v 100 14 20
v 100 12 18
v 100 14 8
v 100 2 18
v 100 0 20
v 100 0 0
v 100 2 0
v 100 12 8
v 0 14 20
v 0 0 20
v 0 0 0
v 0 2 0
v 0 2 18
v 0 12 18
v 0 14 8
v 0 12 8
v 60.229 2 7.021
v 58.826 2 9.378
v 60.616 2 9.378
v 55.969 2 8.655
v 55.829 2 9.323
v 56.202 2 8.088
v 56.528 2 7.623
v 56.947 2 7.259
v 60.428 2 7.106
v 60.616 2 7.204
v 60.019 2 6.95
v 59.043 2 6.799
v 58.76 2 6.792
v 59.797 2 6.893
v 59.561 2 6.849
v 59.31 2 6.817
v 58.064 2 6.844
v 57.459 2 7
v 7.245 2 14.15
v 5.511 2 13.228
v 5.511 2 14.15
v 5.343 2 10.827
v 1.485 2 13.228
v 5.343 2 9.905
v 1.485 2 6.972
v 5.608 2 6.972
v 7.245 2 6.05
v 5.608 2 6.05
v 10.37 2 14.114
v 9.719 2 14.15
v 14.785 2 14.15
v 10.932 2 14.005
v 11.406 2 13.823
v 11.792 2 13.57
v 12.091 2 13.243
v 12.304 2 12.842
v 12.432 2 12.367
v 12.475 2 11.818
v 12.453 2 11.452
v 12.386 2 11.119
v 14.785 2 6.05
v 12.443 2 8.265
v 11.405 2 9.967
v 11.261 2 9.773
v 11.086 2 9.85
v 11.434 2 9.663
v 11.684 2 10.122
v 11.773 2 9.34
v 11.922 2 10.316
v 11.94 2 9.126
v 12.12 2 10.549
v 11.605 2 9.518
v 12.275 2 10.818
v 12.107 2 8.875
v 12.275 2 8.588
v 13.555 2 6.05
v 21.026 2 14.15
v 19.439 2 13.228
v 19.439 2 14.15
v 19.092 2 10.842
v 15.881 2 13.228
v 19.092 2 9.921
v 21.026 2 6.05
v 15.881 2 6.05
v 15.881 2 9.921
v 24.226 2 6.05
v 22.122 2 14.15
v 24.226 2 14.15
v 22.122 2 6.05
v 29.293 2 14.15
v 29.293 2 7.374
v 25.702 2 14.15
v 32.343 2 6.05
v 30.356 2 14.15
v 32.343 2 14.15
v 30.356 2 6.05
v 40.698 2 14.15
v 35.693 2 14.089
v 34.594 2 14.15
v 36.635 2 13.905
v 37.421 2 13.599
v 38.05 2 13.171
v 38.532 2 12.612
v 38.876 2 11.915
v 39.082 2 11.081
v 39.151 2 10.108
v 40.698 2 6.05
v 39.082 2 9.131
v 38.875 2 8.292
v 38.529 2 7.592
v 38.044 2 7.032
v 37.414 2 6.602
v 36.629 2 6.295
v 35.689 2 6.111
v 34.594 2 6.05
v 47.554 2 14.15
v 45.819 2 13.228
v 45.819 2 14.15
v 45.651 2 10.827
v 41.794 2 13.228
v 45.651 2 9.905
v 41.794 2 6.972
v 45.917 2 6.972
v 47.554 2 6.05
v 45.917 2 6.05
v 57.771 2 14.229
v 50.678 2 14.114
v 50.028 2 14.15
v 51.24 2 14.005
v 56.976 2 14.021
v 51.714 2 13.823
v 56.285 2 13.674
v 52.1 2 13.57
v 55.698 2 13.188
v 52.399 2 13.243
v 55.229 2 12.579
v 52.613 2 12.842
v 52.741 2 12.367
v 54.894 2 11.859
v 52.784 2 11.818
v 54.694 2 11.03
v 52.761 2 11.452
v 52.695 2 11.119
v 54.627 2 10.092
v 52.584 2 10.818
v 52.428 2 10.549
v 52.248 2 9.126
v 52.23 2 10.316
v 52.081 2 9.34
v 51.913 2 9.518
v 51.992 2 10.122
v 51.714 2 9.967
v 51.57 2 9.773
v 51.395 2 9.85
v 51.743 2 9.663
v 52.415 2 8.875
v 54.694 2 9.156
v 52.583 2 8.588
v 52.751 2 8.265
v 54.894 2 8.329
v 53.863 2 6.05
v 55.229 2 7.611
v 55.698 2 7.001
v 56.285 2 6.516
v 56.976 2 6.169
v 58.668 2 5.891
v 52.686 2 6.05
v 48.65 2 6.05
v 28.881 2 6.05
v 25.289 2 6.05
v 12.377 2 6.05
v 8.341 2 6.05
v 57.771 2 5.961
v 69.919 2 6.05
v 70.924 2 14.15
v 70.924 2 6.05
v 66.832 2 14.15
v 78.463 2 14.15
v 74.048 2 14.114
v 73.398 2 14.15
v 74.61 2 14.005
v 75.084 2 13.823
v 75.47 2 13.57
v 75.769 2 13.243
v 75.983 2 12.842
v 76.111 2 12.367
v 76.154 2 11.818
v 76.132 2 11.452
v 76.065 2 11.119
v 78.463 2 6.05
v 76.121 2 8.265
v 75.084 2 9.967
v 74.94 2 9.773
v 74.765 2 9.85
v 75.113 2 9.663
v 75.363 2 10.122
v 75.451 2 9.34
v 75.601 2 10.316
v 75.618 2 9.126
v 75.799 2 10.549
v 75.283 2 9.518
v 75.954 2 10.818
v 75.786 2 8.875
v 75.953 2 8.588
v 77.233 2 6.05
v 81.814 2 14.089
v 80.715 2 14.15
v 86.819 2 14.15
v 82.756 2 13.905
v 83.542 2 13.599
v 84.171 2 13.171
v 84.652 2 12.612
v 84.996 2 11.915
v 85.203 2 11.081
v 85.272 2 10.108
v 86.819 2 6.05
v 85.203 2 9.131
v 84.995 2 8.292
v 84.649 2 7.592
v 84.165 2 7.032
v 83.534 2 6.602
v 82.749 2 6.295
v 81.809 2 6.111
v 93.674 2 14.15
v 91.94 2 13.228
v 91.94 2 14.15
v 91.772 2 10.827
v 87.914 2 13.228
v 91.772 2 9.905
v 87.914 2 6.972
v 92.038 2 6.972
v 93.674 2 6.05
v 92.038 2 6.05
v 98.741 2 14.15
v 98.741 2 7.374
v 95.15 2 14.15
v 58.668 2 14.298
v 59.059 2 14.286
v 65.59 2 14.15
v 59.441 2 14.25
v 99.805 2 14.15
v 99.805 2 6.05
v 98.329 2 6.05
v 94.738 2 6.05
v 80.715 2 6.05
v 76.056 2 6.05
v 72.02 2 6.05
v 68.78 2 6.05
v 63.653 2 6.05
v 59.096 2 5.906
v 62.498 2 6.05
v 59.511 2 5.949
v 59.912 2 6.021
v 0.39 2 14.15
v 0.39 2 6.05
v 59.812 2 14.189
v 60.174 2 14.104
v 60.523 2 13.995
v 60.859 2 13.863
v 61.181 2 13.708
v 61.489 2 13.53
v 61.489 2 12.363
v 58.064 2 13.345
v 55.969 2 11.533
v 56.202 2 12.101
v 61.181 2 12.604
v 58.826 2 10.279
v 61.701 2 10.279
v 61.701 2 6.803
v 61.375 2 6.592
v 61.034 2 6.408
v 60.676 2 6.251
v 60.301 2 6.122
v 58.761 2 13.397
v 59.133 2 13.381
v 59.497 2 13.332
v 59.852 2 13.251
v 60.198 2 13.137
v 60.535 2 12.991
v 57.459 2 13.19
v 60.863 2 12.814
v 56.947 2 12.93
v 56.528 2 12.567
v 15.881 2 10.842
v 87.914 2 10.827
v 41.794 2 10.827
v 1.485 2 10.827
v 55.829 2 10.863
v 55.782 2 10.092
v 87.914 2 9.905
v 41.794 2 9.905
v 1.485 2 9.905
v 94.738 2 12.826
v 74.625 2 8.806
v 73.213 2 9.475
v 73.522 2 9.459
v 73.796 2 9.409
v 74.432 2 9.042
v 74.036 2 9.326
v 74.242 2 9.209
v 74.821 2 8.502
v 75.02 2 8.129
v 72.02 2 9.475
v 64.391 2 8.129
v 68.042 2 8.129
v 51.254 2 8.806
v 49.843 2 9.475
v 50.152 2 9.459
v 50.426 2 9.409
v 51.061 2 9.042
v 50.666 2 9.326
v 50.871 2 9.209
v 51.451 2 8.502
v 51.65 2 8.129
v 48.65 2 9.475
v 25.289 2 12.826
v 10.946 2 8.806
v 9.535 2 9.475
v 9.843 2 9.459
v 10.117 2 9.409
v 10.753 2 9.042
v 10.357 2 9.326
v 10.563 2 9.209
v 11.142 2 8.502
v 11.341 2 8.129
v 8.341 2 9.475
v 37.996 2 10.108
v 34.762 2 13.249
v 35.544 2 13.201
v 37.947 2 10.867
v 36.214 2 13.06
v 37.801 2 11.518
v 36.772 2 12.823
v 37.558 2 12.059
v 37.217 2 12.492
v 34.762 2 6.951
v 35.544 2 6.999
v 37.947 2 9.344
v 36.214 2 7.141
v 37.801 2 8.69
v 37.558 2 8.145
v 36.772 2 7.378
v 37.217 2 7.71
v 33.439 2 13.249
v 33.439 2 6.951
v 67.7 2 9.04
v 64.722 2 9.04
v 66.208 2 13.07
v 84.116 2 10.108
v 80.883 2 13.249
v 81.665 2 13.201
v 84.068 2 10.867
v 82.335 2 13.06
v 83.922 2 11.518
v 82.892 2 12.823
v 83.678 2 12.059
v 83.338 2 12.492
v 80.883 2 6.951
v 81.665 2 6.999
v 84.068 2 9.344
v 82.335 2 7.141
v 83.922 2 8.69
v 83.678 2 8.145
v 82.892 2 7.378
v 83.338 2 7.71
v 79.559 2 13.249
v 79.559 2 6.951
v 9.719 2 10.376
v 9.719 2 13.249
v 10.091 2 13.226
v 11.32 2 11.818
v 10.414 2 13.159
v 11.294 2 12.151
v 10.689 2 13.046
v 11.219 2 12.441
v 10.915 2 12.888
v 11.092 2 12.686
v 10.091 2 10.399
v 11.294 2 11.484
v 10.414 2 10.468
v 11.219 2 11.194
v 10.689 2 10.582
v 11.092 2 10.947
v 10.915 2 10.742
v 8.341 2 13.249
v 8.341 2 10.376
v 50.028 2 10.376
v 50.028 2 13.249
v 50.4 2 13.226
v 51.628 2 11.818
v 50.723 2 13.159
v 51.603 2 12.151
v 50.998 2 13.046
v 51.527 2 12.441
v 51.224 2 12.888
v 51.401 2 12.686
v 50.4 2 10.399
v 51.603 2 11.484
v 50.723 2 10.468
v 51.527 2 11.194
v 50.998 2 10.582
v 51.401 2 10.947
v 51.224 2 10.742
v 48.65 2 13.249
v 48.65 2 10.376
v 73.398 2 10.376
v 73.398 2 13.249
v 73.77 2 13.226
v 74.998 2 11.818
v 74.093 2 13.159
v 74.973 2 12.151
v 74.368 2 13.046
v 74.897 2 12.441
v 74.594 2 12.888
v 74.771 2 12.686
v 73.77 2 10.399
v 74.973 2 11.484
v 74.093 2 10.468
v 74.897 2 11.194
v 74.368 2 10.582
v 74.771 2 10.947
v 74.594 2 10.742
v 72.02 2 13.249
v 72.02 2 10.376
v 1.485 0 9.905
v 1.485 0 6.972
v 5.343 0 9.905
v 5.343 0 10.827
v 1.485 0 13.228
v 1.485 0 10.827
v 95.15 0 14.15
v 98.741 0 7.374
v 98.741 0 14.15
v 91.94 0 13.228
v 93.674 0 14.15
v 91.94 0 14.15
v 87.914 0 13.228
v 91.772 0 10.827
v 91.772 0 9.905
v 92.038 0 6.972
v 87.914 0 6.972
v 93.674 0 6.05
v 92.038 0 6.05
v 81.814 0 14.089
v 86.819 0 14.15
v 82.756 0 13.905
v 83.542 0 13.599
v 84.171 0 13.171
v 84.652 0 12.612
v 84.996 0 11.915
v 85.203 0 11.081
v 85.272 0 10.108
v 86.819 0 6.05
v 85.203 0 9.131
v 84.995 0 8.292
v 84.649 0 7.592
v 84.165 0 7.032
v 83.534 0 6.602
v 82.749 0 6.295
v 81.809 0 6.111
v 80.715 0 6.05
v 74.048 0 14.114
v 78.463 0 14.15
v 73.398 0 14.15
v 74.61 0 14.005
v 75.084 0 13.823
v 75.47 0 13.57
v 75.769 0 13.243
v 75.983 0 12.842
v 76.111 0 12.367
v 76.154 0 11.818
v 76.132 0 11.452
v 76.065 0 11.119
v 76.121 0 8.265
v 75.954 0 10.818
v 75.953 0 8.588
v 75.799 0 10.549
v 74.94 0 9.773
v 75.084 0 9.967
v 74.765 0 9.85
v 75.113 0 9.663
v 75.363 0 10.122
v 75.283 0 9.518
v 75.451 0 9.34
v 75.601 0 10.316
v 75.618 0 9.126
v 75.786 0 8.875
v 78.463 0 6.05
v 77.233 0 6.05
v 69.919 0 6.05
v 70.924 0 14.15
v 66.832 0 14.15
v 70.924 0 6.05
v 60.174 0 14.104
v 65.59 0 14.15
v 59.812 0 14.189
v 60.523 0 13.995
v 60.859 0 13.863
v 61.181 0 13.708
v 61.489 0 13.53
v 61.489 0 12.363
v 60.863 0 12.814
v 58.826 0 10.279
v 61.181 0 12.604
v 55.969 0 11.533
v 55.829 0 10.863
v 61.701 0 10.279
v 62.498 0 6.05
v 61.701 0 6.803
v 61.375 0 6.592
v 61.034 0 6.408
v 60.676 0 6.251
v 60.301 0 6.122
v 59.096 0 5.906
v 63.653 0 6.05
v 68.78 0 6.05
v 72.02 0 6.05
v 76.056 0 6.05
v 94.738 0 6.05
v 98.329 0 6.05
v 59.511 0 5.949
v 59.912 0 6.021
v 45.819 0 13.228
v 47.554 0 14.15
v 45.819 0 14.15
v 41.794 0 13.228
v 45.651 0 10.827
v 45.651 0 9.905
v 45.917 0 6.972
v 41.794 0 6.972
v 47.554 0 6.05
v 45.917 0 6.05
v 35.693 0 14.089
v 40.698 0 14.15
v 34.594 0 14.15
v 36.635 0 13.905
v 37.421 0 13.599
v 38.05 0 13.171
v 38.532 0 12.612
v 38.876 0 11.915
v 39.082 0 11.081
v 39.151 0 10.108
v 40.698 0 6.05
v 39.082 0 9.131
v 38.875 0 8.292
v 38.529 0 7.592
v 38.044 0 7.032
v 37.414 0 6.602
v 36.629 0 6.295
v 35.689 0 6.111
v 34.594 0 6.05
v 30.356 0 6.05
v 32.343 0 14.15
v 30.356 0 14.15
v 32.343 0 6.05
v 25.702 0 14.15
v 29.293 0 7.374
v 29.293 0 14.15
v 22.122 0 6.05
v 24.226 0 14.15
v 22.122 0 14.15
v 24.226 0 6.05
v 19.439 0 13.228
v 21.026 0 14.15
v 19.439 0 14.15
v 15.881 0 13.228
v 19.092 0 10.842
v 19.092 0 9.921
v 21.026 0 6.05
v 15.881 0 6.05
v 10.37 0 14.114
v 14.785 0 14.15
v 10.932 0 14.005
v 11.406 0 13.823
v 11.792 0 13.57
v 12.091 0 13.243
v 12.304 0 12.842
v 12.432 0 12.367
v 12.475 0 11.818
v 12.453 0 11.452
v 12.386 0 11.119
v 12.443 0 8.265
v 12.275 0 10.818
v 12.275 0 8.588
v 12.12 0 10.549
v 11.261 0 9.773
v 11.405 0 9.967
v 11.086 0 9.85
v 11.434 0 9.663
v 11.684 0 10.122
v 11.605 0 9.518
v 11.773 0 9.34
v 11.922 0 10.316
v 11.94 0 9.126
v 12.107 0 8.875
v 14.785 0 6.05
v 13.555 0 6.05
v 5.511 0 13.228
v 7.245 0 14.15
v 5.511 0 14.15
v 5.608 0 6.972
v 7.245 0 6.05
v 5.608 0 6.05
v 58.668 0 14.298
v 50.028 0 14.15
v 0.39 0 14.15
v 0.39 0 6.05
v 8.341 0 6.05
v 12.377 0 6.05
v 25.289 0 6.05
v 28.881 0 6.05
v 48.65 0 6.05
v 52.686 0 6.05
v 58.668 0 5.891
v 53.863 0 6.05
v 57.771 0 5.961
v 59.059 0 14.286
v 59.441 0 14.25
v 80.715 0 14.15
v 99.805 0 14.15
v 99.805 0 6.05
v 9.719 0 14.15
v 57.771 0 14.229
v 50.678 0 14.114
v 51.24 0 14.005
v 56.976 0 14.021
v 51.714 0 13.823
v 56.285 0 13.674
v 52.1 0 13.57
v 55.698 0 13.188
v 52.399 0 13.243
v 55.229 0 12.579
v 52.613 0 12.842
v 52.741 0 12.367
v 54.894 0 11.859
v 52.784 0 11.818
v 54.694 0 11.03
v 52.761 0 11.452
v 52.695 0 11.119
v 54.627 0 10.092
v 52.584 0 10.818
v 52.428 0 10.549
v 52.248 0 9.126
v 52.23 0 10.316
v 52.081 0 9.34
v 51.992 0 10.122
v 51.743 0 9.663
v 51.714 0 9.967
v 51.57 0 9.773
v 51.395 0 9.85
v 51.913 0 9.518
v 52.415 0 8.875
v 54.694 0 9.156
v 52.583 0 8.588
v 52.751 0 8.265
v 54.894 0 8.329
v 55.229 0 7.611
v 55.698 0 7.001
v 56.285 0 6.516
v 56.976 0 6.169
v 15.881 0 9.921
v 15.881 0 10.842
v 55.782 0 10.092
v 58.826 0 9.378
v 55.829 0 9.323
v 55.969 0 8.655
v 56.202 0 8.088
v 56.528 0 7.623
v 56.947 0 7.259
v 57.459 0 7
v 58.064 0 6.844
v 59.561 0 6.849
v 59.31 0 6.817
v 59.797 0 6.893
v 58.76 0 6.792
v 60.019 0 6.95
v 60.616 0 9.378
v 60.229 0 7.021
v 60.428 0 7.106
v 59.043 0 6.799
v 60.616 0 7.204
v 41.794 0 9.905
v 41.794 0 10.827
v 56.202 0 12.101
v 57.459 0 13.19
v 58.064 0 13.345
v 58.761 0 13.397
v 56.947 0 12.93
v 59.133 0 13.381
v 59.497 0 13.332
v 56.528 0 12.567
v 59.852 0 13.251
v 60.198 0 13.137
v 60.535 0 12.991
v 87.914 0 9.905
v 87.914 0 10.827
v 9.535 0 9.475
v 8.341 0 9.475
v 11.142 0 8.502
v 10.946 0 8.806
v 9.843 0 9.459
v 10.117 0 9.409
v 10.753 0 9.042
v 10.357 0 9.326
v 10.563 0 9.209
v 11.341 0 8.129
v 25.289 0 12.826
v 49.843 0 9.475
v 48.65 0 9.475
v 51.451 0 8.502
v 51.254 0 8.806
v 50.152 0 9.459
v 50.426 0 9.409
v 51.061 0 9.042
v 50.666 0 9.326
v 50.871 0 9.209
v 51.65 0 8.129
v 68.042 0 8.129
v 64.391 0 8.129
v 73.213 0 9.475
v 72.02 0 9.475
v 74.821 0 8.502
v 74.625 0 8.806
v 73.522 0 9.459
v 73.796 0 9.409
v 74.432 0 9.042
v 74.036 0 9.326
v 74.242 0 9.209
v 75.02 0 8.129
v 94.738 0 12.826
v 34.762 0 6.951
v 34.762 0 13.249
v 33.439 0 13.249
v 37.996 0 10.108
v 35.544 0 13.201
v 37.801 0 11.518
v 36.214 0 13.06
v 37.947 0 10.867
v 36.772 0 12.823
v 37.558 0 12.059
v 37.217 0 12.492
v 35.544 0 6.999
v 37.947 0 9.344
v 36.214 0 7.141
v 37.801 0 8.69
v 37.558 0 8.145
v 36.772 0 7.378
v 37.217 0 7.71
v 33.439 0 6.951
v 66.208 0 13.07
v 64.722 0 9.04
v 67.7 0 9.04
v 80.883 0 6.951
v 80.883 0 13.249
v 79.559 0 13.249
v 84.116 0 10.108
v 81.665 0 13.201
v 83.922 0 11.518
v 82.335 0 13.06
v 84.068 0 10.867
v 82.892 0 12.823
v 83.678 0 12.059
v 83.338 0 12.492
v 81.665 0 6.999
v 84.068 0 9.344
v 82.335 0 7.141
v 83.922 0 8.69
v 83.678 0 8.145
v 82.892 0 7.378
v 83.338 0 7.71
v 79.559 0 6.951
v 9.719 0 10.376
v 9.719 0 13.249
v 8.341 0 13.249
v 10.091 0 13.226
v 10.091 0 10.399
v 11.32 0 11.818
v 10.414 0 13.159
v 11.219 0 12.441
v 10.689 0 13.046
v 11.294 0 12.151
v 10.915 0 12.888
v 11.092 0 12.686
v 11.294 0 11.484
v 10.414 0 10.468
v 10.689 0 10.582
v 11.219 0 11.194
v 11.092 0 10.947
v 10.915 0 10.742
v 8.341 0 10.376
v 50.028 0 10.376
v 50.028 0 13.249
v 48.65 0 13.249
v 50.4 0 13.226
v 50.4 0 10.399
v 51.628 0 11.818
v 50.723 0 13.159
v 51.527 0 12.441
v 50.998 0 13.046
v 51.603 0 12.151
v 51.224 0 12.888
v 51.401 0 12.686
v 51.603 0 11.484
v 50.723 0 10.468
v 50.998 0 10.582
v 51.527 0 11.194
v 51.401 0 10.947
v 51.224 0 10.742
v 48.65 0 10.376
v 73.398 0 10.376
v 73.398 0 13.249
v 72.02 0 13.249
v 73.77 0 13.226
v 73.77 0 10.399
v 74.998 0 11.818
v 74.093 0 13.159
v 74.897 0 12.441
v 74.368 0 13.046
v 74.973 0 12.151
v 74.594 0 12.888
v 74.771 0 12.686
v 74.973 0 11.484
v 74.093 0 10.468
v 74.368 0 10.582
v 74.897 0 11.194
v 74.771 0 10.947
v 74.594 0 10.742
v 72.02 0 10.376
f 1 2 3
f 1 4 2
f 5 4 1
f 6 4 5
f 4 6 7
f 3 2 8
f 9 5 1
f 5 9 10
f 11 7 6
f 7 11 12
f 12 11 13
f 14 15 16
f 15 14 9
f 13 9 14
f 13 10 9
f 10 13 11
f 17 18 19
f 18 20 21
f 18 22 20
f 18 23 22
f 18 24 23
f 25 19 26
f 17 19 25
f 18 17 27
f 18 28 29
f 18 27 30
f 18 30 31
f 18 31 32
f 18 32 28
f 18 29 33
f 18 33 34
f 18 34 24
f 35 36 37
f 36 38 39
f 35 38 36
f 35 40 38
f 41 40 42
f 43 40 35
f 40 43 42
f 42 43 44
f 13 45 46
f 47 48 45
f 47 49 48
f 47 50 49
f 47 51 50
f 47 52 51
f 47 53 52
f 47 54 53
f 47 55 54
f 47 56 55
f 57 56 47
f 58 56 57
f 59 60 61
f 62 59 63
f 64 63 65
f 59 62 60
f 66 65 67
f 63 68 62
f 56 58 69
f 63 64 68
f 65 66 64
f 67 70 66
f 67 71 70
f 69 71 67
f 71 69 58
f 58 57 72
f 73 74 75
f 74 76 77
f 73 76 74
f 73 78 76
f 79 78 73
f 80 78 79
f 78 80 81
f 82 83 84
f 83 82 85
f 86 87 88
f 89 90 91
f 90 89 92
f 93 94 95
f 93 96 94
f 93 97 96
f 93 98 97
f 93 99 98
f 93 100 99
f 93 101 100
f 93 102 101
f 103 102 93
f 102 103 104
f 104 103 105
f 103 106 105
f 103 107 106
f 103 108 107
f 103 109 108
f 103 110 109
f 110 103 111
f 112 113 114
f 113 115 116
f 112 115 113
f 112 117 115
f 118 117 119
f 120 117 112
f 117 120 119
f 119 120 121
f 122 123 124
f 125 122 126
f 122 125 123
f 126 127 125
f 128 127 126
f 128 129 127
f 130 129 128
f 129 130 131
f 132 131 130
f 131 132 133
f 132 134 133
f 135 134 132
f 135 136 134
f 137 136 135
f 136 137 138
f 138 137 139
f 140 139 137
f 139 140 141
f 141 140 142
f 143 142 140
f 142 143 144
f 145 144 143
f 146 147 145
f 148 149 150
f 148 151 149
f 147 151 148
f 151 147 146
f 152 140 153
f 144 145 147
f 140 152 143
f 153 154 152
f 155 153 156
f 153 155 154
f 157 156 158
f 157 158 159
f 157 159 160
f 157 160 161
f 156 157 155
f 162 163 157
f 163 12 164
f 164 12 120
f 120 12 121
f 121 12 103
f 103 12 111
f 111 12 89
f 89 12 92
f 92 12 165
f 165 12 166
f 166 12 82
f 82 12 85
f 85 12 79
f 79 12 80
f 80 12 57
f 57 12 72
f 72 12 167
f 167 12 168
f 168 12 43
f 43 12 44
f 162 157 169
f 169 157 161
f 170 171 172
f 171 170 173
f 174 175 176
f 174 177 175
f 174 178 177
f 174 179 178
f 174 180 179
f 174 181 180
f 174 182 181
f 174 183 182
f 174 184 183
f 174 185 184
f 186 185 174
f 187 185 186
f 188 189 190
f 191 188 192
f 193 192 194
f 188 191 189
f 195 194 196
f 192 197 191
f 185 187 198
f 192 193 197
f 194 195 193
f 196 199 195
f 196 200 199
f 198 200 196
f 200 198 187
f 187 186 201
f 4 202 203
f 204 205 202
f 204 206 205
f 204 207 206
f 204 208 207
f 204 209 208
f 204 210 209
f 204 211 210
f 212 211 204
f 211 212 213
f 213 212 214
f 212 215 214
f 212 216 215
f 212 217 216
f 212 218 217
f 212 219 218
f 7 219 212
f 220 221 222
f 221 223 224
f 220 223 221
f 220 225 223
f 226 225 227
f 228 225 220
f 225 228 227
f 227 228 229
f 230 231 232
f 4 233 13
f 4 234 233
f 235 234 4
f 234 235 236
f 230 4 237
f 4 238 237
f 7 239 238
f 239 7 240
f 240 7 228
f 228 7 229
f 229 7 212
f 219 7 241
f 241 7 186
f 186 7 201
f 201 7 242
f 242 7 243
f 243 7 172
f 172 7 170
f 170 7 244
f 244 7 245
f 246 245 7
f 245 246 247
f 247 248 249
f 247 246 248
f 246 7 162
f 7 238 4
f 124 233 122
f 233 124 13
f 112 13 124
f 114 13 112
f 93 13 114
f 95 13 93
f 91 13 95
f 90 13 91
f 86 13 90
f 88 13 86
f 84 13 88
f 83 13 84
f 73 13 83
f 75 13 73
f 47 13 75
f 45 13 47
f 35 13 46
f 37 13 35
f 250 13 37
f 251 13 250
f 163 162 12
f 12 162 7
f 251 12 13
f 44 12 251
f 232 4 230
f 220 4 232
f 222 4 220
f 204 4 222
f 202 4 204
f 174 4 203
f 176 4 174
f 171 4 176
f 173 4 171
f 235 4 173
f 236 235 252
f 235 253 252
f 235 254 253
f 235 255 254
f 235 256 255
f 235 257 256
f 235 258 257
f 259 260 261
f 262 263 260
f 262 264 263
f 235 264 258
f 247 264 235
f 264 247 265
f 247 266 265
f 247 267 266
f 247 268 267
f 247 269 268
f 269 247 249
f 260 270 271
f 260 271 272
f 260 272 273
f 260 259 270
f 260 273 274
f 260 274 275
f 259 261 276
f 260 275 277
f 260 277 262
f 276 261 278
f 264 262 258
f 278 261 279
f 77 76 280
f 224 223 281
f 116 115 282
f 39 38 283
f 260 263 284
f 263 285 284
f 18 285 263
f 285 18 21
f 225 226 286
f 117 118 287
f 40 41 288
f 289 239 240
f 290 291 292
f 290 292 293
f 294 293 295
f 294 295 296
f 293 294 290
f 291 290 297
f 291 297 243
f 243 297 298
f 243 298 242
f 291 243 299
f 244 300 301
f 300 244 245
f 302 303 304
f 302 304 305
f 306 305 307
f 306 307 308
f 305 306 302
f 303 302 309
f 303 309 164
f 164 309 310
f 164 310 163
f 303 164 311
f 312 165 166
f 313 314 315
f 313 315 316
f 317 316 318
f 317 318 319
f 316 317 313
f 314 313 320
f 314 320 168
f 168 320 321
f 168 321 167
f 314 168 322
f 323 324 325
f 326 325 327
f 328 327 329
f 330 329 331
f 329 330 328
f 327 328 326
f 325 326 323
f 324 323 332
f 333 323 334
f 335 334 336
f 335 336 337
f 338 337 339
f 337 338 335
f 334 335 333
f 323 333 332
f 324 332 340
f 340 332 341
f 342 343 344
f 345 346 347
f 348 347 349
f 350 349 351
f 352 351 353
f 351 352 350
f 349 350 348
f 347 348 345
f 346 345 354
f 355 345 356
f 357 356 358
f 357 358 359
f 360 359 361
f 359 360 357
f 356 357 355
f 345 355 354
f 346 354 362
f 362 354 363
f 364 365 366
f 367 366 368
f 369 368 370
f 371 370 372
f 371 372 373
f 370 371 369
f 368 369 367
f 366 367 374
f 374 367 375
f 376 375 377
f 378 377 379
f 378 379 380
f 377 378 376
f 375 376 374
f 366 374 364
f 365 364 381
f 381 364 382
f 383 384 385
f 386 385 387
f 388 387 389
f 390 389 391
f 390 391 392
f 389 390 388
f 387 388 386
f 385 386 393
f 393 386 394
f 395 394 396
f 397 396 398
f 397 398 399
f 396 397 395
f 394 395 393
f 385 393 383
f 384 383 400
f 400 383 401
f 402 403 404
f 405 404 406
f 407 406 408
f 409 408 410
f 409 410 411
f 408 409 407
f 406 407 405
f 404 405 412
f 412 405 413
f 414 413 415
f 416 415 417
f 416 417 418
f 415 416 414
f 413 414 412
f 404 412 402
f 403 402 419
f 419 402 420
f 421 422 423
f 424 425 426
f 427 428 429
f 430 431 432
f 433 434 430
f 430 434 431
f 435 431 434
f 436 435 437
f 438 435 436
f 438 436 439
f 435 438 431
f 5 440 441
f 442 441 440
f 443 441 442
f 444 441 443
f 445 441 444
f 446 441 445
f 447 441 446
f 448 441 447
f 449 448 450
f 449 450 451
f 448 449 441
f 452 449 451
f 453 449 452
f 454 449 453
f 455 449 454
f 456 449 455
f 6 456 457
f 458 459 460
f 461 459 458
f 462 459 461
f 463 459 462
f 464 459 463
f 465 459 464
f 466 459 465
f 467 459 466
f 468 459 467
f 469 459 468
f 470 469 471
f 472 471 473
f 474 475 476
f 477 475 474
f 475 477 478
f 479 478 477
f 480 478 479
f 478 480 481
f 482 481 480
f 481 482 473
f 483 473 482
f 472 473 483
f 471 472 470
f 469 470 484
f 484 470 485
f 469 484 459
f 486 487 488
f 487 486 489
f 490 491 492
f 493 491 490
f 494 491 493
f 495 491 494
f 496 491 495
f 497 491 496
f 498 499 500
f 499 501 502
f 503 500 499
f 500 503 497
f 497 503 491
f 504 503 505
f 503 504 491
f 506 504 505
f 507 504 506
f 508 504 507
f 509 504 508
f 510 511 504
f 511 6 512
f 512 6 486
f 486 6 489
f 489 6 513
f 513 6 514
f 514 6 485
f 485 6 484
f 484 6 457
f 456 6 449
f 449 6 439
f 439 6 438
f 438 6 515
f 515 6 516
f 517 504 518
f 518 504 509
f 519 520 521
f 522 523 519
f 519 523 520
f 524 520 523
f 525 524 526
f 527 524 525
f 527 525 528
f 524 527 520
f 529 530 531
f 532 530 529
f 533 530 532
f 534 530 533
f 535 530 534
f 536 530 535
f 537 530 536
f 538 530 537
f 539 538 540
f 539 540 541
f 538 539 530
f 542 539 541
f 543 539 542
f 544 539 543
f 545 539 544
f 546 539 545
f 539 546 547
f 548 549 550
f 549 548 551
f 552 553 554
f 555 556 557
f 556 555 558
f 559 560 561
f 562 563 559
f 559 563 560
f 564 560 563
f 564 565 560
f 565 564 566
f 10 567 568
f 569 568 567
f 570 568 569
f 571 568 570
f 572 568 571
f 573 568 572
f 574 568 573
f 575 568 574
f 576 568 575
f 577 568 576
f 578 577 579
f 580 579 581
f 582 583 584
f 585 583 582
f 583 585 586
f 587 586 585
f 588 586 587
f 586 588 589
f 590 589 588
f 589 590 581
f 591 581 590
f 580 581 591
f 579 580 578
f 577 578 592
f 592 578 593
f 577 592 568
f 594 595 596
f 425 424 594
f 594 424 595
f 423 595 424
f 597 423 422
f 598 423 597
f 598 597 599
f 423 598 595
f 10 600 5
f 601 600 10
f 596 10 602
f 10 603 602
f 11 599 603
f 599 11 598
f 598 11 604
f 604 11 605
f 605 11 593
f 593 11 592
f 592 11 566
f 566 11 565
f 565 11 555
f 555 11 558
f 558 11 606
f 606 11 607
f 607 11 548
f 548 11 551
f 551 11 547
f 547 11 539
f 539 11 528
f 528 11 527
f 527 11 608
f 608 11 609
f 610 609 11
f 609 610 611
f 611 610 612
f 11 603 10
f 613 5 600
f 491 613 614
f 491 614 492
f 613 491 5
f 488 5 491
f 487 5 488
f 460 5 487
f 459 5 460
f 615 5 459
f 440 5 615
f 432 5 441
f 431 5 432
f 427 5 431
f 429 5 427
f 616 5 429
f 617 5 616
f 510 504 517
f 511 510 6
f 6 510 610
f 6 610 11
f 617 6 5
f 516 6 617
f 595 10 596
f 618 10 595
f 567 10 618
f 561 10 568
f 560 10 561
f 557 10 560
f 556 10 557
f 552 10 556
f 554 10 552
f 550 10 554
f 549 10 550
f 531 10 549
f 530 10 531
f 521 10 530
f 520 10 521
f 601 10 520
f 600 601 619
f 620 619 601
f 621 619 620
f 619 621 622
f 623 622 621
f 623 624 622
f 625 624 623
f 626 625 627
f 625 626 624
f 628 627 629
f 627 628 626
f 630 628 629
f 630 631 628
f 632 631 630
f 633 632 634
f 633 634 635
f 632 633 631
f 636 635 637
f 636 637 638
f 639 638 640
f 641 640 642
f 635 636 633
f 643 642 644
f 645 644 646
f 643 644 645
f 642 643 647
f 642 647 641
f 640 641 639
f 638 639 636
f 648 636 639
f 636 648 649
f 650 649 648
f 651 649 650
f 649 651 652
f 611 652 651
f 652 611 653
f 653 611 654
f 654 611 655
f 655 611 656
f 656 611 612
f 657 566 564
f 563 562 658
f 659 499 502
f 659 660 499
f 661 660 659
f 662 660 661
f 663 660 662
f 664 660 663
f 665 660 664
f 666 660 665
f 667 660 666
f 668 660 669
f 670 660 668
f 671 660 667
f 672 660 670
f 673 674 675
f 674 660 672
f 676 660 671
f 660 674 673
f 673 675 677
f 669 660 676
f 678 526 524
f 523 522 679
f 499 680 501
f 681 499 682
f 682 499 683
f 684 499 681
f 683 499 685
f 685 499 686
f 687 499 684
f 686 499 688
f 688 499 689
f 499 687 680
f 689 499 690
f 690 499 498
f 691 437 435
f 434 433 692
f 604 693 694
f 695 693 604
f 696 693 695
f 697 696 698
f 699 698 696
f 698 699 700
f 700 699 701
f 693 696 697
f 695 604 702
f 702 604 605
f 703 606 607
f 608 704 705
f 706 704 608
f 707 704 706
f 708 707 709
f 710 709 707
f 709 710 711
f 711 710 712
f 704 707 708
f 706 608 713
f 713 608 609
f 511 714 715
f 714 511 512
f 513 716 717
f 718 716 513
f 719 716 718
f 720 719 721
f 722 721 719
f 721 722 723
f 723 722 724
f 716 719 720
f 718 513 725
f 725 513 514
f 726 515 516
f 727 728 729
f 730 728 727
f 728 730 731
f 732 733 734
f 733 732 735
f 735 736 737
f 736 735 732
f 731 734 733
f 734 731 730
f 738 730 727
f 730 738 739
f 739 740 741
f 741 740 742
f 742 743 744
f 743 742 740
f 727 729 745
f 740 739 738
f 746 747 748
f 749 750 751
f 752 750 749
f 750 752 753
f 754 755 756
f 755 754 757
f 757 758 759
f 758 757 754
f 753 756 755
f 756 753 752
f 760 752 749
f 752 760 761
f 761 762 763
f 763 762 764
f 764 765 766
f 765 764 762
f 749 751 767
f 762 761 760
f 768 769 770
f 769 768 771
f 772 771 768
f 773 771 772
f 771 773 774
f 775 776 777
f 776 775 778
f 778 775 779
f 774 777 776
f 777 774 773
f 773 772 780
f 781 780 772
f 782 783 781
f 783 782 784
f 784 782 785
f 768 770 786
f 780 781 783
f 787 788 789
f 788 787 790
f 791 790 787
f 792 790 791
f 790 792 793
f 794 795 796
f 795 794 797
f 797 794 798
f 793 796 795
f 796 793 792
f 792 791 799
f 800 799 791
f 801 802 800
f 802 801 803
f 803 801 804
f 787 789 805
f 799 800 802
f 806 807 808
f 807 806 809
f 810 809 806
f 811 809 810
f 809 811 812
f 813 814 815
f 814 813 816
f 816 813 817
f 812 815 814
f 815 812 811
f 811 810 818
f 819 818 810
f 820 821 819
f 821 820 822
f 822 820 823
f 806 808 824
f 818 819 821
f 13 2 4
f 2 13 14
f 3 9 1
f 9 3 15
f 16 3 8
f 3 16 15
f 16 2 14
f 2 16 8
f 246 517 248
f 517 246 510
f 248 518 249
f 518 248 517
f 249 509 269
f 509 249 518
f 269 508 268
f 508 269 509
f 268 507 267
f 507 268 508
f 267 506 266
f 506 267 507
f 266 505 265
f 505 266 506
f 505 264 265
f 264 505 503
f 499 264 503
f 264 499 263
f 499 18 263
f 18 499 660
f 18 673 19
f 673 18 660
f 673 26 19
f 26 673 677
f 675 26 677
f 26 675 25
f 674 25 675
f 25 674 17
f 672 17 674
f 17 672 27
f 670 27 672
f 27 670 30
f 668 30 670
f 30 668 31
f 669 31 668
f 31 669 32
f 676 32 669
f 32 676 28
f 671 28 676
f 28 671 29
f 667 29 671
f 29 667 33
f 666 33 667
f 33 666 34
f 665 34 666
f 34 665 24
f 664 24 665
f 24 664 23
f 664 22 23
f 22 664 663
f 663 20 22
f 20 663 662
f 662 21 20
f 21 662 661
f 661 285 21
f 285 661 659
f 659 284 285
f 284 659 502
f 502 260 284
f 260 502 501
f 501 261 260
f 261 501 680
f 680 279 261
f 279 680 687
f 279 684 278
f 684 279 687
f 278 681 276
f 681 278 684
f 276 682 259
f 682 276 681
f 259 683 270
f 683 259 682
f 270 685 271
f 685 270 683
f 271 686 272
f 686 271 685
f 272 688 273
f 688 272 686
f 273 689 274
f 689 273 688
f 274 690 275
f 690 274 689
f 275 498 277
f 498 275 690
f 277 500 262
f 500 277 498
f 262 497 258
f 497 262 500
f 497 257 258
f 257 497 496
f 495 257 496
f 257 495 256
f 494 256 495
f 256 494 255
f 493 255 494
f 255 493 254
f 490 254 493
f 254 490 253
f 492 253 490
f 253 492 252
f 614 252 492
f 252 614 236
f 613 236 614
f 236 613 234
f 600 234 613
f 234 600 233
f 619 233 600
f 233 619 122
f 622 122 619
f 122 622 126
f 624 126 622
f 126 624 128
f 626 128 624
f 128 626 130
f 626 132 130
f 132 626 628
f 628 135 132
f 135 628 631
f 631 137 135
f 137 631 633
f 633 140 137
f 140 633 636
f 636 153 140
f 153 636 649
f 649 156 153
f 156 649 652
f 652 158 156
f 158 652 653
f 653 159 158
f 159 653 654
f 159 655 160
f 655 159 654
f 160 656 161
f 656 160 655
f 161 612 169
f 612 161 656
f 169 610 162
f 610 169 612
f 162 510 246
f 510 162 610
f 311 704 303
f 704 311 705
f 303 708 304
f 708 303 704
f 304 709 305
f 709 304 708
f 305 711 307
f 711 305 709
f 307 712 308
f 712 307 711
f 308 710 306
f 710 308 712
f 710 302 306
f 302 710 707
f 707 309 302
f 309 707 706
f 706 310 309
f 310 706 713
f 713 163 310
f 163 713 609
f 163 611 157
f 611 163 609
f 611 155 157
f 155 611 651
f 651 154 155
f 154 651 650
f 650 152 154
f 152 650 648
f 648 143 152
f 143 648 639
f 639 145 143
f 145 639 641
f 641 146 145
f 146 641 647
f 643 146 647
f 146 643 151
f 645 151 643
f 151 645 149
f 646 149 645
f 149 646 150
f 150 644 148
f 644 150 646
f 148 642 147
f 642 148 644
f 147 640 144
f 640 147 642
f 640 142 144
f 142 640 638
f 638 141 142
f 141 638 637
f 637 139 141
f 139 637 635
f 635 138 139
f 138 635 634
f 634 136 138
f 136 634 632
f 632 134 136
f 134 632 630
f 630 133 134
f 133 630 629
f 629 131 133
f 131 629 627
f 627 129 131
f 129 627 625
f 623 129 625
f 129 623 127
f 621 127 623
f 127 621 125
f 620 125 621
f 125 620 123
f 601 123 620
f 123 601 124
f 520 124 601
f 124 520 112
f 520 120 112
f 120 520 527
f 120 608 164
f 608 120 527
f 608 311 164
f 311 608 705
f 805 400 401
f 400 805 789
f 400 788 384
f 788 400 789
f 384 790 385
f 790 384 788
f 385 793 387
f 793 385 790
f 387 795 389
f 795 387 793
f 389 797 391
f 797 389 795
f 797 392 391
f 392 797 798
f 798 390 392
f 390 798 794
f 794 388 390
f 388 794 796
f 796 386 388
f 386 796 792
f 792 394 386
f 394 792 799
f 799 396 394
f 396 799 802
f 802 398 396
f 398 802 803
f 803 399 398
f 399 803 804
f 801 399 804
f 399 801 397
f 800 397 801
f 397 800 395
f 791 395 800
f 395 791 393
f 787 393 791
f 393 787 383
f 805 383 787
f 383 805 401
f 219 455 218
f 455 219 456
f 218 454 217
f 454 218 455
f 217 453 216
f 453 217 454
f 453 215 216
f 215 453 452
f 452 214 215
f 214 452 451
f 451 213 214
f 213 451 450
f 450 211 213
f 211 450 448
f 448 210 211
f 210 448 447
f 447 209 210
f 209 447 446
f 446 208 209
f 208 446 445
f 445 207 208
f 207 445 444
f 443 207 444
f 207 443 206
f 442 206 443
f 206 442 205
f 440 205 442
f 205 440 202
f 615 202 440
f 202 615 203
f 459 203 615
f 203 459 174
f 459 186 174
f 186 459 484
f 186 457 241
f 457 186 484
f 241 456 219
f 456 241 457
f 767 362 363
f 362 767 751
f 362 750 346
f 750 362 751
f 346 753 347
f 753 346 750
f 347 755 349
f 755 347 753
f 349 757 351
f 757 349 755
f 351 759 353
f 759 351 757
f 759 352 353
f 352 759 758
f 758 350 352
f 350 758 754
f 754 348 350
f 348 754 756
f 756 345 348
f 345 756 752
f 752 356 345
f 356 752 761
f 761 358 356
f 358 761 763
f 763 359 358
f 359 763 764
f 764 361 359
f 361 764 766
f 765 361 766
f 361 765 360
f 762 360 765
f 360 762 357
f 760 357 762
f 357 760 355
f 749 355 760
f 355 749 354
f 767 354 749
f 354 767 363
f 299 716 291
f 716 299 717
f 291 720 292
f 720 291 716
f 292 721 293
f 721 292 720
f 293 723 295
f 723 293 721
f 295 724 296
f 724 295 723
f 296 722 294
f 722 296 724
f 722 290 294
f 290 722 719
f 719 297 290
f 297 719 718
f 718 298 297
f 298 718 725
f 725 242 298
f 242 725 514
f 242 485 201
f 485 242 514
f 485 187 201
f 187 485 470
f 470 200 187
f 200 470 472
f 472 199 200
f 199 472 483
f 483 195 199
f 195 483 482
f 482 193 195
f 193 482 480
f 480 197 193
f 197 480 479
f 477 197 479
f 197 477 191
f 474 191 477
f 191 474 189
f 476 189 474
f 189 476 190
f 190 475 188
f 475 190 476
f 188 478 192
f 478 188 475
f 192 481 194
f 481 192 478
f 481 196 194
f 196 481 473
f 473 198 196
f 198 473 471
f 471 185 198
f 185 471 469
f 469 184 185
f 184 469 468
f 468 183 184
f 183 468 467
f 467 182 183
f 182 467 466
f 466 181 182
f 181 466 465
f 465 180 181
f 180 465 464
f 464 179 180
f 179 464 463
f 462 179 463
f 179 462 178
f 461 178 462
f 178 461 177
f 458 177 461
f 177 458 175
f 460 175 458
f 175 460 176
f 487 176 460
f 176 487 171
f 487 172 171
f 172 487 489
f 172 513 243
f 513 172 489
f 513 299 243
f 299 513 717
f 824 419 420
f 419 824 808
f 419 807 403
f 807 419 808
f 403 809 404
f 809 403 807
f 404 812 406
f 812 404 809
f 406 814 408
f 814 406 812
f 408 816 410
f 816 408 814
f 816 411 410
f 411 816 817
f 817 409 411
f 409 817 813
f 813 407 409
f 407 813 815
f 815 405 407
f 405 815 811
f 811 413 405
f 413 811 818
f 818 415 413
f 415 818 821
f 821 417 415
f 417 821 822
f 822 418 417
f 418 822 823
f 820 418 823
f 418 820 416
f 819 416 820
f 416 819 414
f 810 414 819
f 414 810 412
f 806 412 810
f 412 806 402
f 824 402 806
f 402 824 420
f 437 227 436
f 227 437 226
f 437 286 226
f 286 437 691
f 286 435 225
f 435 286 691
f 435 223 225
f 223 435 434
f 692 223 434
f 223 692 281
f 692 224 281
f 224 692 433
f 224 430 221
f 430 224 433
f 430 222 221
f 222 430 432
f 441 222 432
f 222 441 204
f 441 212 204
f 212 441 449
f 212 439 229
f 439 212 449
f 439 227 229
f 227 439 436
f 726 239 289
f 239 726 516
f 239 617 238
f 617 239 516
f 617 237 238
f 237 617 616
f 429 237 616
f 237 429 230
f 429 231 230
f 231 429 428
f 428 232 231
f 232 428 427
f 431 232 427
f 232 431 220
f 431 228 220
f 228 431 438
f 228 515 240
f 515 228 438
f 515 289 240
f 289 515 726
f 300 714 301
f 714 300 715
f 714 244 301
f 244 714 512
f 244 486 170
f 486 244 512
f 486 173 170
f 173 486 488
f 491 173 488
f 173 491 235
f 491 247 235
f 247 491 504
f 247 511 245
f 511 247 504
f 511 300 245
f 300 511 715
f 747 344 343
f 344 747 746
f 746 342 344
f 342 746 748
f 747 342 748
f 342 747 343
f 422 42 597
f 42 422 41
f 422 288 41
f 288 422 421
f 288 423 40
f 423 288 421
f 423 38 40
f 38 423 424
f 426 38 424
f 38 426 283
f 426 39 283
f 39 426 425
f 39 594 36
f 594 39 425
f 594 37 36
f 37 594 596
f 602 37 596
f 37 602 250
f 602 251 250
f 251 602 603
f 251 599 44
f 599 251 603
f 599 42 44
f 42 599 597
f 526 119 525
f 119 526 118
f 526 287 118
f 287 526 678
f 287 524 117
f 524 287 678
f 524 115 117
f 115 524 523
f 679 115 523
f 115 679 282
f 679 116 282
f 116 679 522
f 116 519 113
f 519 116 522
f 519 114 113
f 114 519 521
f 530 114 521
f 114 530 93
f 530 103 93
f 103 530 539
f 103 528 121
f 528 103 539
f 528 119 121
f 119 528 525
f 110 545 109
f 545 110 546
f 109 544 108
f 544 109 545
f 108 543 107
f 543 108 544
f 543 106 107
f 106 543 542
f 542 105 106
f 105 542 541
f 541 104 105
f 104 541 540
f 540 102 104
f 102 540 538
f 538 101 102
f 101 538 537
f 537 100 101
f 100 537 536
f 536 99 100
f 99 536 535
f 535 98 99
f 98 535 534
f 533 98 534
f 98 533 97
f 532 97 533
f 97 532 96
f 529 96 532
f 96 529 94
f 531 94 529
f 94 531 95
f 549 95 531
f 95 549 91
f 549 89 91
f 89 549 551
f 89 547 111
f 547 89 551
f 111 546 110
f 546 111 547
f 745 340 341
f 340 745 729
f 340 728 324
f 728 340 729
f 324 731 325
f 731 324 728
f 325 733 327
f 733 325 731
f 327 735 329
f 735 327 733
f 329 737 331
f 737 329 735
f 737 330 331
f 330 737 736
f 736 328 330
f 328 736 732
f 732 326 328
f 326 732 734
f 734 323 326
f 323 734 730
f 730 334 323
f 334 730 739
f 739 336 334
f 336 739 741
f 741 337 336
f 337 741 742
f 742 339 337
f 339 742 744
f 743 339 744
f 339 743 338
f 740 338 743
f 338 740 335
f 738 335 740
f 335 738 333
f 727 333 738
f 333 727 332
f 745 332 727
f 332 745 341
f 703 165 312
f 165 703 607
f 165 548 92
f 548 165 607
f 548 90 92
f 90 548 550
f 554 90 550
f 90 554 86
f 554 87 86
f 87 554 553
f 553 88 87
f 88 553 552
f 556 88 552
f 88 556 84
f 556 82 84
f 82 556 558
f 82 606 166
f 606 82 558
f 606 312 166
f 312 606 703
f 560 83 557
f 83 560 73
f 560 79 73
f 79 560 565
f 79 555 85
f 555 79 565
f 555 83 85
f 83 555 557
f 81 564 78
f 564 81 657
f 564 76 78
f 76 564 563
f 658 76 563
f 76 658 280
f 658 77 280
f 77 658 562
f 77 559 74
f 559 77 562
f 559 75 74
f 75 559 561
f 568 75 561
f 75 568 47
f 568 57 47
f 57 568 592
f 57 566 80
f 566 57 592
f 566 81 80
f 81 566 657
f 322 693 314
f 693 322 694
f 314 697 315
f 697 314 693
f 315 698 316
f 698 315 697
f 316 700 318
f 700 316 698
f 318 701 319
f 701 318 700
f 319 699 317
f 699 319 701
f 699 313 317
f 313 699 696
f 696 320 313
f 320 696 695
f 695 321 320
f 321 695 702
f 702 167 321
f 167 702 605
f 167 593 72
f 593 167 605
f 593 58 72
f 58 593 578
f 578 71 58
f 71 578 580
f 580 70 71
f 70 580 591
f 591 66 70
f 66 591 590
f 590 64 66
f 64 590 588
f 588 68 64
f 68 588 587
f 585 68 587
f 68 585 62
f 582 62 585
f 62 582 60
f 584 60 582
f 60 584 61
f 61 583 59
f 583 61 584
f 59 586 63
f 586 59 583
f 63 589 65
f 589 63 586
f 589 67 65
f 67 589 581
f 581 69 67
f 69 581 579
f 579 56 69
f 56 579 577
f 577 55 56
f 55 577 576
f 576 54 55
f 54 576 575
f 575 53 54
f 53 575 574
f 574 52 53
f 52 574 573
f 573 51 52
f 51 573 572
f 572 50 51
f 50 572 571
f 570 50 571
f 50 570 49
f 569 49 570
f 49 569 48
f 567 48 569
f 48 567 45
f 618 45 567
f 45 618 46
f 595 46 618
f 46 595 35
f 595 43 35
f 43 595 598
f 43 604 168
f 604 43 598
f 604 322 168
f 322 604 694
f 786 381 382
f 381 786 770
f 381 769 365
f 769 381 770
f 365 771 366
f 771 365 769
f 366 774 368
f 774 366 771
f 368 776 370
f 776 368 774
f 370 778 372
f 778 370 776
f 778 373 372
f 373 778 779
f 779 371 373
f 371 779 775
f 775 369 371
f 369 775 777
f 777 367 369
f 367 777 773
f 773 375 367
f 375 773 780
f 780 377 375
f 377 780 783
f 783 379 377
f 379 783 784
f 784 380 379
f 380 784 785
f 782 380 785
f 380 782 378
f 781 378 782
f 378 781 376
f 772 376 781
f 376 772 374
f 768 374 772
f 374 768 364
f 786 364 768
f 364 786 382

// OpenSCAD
/**
 * A labelling system for IKEA Trofast containers. Customizable text.
 *
 * Author: Joseph Paul <joseph@sehrgute.software>
 * License: Public Domain
 */


/* [Tag Dimensions] */

// Material thickness of the entire tag
thickness = 2; // [1:10]
// Lenght of the tag (keep <130mm for the short side and <230mm for the long side of your Trofast)
length = 100; // [10:230]
// Width of the entire Tag
width = 20; // [10:230]


/* [Caption] */

// The text written on the tag
subject = "ERFINDERGARDEN";
// Font size for the text
font_size = 8; // [2:128]
// Font Family (all google fonts are supported, see https:\/\/fonts.google.com)
font_family = "Open Sans";

hinge_space = 10;
hinge_height = 10;

module tag()
{
	union() {
		cube([length, thickness, width]);
		translate([0, 0, width - thickness])
		cube([length, hinge_space + 2*thickness, thickness]);
		translate([0, hinge_space + thickness, width - thickness - hinge_height])
		cube([length, thickness, hinge_height]);
	}
}

module caption()
{
	text(subject, font=font_family, size=font_size, valign="center", halign="center");
}

difference() {
	tag();
	translate([length/2, thickness+1, width/2])
	rotate([90, 0, 0])
	linear_extrude(thickness+2)
	caption();
}
